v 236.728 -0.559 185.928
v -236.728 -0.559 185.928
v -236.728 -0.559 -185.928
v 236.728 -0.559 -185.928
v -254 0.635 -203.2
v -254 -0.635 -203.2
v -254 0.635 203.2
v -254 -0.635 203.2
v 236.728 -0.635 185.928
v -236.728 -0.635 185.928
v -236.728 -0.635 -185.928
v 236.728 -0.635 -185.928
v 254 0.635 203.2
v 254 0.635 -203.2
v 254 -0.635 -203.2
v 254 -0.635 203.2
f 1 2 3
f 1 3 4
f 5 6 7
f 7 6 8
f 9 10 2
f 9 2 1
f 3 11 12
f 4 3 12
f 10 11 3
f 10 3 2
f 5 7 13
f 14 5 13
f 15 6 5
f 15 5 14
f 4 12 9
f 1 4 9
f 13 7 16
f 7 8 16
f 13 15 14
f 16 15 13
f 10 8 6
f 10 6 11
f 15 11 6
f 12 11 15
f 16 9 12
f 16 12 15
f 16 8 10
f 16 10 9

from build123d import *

# Parameters (mm, degrees)
F0_W     = 508
F0_H     = 406.4
F1_DEPTH = 0.635
F2_W     = 473.456
F2_H     = 371.856
F3_DEPTH = 0.0762


with BuildPart() as f1:
    # F0 (on Front) → F1 (new body, symmetric)
    with BuildSketch(Plane.XZ):
        Rectangle(F0_W, F0_H)
    extrude(amount=F1_DEPTH, both=True)

    # F2 (on face) → F3 (cut)
    with BuildSketch(Plane.XZ.offset(0.635)):
        Rectangle(F2_W, F2_H)
    extrude(amount=-F3_DEPTH, mode=Mode.SUBTRACT)


solid = f1.part
